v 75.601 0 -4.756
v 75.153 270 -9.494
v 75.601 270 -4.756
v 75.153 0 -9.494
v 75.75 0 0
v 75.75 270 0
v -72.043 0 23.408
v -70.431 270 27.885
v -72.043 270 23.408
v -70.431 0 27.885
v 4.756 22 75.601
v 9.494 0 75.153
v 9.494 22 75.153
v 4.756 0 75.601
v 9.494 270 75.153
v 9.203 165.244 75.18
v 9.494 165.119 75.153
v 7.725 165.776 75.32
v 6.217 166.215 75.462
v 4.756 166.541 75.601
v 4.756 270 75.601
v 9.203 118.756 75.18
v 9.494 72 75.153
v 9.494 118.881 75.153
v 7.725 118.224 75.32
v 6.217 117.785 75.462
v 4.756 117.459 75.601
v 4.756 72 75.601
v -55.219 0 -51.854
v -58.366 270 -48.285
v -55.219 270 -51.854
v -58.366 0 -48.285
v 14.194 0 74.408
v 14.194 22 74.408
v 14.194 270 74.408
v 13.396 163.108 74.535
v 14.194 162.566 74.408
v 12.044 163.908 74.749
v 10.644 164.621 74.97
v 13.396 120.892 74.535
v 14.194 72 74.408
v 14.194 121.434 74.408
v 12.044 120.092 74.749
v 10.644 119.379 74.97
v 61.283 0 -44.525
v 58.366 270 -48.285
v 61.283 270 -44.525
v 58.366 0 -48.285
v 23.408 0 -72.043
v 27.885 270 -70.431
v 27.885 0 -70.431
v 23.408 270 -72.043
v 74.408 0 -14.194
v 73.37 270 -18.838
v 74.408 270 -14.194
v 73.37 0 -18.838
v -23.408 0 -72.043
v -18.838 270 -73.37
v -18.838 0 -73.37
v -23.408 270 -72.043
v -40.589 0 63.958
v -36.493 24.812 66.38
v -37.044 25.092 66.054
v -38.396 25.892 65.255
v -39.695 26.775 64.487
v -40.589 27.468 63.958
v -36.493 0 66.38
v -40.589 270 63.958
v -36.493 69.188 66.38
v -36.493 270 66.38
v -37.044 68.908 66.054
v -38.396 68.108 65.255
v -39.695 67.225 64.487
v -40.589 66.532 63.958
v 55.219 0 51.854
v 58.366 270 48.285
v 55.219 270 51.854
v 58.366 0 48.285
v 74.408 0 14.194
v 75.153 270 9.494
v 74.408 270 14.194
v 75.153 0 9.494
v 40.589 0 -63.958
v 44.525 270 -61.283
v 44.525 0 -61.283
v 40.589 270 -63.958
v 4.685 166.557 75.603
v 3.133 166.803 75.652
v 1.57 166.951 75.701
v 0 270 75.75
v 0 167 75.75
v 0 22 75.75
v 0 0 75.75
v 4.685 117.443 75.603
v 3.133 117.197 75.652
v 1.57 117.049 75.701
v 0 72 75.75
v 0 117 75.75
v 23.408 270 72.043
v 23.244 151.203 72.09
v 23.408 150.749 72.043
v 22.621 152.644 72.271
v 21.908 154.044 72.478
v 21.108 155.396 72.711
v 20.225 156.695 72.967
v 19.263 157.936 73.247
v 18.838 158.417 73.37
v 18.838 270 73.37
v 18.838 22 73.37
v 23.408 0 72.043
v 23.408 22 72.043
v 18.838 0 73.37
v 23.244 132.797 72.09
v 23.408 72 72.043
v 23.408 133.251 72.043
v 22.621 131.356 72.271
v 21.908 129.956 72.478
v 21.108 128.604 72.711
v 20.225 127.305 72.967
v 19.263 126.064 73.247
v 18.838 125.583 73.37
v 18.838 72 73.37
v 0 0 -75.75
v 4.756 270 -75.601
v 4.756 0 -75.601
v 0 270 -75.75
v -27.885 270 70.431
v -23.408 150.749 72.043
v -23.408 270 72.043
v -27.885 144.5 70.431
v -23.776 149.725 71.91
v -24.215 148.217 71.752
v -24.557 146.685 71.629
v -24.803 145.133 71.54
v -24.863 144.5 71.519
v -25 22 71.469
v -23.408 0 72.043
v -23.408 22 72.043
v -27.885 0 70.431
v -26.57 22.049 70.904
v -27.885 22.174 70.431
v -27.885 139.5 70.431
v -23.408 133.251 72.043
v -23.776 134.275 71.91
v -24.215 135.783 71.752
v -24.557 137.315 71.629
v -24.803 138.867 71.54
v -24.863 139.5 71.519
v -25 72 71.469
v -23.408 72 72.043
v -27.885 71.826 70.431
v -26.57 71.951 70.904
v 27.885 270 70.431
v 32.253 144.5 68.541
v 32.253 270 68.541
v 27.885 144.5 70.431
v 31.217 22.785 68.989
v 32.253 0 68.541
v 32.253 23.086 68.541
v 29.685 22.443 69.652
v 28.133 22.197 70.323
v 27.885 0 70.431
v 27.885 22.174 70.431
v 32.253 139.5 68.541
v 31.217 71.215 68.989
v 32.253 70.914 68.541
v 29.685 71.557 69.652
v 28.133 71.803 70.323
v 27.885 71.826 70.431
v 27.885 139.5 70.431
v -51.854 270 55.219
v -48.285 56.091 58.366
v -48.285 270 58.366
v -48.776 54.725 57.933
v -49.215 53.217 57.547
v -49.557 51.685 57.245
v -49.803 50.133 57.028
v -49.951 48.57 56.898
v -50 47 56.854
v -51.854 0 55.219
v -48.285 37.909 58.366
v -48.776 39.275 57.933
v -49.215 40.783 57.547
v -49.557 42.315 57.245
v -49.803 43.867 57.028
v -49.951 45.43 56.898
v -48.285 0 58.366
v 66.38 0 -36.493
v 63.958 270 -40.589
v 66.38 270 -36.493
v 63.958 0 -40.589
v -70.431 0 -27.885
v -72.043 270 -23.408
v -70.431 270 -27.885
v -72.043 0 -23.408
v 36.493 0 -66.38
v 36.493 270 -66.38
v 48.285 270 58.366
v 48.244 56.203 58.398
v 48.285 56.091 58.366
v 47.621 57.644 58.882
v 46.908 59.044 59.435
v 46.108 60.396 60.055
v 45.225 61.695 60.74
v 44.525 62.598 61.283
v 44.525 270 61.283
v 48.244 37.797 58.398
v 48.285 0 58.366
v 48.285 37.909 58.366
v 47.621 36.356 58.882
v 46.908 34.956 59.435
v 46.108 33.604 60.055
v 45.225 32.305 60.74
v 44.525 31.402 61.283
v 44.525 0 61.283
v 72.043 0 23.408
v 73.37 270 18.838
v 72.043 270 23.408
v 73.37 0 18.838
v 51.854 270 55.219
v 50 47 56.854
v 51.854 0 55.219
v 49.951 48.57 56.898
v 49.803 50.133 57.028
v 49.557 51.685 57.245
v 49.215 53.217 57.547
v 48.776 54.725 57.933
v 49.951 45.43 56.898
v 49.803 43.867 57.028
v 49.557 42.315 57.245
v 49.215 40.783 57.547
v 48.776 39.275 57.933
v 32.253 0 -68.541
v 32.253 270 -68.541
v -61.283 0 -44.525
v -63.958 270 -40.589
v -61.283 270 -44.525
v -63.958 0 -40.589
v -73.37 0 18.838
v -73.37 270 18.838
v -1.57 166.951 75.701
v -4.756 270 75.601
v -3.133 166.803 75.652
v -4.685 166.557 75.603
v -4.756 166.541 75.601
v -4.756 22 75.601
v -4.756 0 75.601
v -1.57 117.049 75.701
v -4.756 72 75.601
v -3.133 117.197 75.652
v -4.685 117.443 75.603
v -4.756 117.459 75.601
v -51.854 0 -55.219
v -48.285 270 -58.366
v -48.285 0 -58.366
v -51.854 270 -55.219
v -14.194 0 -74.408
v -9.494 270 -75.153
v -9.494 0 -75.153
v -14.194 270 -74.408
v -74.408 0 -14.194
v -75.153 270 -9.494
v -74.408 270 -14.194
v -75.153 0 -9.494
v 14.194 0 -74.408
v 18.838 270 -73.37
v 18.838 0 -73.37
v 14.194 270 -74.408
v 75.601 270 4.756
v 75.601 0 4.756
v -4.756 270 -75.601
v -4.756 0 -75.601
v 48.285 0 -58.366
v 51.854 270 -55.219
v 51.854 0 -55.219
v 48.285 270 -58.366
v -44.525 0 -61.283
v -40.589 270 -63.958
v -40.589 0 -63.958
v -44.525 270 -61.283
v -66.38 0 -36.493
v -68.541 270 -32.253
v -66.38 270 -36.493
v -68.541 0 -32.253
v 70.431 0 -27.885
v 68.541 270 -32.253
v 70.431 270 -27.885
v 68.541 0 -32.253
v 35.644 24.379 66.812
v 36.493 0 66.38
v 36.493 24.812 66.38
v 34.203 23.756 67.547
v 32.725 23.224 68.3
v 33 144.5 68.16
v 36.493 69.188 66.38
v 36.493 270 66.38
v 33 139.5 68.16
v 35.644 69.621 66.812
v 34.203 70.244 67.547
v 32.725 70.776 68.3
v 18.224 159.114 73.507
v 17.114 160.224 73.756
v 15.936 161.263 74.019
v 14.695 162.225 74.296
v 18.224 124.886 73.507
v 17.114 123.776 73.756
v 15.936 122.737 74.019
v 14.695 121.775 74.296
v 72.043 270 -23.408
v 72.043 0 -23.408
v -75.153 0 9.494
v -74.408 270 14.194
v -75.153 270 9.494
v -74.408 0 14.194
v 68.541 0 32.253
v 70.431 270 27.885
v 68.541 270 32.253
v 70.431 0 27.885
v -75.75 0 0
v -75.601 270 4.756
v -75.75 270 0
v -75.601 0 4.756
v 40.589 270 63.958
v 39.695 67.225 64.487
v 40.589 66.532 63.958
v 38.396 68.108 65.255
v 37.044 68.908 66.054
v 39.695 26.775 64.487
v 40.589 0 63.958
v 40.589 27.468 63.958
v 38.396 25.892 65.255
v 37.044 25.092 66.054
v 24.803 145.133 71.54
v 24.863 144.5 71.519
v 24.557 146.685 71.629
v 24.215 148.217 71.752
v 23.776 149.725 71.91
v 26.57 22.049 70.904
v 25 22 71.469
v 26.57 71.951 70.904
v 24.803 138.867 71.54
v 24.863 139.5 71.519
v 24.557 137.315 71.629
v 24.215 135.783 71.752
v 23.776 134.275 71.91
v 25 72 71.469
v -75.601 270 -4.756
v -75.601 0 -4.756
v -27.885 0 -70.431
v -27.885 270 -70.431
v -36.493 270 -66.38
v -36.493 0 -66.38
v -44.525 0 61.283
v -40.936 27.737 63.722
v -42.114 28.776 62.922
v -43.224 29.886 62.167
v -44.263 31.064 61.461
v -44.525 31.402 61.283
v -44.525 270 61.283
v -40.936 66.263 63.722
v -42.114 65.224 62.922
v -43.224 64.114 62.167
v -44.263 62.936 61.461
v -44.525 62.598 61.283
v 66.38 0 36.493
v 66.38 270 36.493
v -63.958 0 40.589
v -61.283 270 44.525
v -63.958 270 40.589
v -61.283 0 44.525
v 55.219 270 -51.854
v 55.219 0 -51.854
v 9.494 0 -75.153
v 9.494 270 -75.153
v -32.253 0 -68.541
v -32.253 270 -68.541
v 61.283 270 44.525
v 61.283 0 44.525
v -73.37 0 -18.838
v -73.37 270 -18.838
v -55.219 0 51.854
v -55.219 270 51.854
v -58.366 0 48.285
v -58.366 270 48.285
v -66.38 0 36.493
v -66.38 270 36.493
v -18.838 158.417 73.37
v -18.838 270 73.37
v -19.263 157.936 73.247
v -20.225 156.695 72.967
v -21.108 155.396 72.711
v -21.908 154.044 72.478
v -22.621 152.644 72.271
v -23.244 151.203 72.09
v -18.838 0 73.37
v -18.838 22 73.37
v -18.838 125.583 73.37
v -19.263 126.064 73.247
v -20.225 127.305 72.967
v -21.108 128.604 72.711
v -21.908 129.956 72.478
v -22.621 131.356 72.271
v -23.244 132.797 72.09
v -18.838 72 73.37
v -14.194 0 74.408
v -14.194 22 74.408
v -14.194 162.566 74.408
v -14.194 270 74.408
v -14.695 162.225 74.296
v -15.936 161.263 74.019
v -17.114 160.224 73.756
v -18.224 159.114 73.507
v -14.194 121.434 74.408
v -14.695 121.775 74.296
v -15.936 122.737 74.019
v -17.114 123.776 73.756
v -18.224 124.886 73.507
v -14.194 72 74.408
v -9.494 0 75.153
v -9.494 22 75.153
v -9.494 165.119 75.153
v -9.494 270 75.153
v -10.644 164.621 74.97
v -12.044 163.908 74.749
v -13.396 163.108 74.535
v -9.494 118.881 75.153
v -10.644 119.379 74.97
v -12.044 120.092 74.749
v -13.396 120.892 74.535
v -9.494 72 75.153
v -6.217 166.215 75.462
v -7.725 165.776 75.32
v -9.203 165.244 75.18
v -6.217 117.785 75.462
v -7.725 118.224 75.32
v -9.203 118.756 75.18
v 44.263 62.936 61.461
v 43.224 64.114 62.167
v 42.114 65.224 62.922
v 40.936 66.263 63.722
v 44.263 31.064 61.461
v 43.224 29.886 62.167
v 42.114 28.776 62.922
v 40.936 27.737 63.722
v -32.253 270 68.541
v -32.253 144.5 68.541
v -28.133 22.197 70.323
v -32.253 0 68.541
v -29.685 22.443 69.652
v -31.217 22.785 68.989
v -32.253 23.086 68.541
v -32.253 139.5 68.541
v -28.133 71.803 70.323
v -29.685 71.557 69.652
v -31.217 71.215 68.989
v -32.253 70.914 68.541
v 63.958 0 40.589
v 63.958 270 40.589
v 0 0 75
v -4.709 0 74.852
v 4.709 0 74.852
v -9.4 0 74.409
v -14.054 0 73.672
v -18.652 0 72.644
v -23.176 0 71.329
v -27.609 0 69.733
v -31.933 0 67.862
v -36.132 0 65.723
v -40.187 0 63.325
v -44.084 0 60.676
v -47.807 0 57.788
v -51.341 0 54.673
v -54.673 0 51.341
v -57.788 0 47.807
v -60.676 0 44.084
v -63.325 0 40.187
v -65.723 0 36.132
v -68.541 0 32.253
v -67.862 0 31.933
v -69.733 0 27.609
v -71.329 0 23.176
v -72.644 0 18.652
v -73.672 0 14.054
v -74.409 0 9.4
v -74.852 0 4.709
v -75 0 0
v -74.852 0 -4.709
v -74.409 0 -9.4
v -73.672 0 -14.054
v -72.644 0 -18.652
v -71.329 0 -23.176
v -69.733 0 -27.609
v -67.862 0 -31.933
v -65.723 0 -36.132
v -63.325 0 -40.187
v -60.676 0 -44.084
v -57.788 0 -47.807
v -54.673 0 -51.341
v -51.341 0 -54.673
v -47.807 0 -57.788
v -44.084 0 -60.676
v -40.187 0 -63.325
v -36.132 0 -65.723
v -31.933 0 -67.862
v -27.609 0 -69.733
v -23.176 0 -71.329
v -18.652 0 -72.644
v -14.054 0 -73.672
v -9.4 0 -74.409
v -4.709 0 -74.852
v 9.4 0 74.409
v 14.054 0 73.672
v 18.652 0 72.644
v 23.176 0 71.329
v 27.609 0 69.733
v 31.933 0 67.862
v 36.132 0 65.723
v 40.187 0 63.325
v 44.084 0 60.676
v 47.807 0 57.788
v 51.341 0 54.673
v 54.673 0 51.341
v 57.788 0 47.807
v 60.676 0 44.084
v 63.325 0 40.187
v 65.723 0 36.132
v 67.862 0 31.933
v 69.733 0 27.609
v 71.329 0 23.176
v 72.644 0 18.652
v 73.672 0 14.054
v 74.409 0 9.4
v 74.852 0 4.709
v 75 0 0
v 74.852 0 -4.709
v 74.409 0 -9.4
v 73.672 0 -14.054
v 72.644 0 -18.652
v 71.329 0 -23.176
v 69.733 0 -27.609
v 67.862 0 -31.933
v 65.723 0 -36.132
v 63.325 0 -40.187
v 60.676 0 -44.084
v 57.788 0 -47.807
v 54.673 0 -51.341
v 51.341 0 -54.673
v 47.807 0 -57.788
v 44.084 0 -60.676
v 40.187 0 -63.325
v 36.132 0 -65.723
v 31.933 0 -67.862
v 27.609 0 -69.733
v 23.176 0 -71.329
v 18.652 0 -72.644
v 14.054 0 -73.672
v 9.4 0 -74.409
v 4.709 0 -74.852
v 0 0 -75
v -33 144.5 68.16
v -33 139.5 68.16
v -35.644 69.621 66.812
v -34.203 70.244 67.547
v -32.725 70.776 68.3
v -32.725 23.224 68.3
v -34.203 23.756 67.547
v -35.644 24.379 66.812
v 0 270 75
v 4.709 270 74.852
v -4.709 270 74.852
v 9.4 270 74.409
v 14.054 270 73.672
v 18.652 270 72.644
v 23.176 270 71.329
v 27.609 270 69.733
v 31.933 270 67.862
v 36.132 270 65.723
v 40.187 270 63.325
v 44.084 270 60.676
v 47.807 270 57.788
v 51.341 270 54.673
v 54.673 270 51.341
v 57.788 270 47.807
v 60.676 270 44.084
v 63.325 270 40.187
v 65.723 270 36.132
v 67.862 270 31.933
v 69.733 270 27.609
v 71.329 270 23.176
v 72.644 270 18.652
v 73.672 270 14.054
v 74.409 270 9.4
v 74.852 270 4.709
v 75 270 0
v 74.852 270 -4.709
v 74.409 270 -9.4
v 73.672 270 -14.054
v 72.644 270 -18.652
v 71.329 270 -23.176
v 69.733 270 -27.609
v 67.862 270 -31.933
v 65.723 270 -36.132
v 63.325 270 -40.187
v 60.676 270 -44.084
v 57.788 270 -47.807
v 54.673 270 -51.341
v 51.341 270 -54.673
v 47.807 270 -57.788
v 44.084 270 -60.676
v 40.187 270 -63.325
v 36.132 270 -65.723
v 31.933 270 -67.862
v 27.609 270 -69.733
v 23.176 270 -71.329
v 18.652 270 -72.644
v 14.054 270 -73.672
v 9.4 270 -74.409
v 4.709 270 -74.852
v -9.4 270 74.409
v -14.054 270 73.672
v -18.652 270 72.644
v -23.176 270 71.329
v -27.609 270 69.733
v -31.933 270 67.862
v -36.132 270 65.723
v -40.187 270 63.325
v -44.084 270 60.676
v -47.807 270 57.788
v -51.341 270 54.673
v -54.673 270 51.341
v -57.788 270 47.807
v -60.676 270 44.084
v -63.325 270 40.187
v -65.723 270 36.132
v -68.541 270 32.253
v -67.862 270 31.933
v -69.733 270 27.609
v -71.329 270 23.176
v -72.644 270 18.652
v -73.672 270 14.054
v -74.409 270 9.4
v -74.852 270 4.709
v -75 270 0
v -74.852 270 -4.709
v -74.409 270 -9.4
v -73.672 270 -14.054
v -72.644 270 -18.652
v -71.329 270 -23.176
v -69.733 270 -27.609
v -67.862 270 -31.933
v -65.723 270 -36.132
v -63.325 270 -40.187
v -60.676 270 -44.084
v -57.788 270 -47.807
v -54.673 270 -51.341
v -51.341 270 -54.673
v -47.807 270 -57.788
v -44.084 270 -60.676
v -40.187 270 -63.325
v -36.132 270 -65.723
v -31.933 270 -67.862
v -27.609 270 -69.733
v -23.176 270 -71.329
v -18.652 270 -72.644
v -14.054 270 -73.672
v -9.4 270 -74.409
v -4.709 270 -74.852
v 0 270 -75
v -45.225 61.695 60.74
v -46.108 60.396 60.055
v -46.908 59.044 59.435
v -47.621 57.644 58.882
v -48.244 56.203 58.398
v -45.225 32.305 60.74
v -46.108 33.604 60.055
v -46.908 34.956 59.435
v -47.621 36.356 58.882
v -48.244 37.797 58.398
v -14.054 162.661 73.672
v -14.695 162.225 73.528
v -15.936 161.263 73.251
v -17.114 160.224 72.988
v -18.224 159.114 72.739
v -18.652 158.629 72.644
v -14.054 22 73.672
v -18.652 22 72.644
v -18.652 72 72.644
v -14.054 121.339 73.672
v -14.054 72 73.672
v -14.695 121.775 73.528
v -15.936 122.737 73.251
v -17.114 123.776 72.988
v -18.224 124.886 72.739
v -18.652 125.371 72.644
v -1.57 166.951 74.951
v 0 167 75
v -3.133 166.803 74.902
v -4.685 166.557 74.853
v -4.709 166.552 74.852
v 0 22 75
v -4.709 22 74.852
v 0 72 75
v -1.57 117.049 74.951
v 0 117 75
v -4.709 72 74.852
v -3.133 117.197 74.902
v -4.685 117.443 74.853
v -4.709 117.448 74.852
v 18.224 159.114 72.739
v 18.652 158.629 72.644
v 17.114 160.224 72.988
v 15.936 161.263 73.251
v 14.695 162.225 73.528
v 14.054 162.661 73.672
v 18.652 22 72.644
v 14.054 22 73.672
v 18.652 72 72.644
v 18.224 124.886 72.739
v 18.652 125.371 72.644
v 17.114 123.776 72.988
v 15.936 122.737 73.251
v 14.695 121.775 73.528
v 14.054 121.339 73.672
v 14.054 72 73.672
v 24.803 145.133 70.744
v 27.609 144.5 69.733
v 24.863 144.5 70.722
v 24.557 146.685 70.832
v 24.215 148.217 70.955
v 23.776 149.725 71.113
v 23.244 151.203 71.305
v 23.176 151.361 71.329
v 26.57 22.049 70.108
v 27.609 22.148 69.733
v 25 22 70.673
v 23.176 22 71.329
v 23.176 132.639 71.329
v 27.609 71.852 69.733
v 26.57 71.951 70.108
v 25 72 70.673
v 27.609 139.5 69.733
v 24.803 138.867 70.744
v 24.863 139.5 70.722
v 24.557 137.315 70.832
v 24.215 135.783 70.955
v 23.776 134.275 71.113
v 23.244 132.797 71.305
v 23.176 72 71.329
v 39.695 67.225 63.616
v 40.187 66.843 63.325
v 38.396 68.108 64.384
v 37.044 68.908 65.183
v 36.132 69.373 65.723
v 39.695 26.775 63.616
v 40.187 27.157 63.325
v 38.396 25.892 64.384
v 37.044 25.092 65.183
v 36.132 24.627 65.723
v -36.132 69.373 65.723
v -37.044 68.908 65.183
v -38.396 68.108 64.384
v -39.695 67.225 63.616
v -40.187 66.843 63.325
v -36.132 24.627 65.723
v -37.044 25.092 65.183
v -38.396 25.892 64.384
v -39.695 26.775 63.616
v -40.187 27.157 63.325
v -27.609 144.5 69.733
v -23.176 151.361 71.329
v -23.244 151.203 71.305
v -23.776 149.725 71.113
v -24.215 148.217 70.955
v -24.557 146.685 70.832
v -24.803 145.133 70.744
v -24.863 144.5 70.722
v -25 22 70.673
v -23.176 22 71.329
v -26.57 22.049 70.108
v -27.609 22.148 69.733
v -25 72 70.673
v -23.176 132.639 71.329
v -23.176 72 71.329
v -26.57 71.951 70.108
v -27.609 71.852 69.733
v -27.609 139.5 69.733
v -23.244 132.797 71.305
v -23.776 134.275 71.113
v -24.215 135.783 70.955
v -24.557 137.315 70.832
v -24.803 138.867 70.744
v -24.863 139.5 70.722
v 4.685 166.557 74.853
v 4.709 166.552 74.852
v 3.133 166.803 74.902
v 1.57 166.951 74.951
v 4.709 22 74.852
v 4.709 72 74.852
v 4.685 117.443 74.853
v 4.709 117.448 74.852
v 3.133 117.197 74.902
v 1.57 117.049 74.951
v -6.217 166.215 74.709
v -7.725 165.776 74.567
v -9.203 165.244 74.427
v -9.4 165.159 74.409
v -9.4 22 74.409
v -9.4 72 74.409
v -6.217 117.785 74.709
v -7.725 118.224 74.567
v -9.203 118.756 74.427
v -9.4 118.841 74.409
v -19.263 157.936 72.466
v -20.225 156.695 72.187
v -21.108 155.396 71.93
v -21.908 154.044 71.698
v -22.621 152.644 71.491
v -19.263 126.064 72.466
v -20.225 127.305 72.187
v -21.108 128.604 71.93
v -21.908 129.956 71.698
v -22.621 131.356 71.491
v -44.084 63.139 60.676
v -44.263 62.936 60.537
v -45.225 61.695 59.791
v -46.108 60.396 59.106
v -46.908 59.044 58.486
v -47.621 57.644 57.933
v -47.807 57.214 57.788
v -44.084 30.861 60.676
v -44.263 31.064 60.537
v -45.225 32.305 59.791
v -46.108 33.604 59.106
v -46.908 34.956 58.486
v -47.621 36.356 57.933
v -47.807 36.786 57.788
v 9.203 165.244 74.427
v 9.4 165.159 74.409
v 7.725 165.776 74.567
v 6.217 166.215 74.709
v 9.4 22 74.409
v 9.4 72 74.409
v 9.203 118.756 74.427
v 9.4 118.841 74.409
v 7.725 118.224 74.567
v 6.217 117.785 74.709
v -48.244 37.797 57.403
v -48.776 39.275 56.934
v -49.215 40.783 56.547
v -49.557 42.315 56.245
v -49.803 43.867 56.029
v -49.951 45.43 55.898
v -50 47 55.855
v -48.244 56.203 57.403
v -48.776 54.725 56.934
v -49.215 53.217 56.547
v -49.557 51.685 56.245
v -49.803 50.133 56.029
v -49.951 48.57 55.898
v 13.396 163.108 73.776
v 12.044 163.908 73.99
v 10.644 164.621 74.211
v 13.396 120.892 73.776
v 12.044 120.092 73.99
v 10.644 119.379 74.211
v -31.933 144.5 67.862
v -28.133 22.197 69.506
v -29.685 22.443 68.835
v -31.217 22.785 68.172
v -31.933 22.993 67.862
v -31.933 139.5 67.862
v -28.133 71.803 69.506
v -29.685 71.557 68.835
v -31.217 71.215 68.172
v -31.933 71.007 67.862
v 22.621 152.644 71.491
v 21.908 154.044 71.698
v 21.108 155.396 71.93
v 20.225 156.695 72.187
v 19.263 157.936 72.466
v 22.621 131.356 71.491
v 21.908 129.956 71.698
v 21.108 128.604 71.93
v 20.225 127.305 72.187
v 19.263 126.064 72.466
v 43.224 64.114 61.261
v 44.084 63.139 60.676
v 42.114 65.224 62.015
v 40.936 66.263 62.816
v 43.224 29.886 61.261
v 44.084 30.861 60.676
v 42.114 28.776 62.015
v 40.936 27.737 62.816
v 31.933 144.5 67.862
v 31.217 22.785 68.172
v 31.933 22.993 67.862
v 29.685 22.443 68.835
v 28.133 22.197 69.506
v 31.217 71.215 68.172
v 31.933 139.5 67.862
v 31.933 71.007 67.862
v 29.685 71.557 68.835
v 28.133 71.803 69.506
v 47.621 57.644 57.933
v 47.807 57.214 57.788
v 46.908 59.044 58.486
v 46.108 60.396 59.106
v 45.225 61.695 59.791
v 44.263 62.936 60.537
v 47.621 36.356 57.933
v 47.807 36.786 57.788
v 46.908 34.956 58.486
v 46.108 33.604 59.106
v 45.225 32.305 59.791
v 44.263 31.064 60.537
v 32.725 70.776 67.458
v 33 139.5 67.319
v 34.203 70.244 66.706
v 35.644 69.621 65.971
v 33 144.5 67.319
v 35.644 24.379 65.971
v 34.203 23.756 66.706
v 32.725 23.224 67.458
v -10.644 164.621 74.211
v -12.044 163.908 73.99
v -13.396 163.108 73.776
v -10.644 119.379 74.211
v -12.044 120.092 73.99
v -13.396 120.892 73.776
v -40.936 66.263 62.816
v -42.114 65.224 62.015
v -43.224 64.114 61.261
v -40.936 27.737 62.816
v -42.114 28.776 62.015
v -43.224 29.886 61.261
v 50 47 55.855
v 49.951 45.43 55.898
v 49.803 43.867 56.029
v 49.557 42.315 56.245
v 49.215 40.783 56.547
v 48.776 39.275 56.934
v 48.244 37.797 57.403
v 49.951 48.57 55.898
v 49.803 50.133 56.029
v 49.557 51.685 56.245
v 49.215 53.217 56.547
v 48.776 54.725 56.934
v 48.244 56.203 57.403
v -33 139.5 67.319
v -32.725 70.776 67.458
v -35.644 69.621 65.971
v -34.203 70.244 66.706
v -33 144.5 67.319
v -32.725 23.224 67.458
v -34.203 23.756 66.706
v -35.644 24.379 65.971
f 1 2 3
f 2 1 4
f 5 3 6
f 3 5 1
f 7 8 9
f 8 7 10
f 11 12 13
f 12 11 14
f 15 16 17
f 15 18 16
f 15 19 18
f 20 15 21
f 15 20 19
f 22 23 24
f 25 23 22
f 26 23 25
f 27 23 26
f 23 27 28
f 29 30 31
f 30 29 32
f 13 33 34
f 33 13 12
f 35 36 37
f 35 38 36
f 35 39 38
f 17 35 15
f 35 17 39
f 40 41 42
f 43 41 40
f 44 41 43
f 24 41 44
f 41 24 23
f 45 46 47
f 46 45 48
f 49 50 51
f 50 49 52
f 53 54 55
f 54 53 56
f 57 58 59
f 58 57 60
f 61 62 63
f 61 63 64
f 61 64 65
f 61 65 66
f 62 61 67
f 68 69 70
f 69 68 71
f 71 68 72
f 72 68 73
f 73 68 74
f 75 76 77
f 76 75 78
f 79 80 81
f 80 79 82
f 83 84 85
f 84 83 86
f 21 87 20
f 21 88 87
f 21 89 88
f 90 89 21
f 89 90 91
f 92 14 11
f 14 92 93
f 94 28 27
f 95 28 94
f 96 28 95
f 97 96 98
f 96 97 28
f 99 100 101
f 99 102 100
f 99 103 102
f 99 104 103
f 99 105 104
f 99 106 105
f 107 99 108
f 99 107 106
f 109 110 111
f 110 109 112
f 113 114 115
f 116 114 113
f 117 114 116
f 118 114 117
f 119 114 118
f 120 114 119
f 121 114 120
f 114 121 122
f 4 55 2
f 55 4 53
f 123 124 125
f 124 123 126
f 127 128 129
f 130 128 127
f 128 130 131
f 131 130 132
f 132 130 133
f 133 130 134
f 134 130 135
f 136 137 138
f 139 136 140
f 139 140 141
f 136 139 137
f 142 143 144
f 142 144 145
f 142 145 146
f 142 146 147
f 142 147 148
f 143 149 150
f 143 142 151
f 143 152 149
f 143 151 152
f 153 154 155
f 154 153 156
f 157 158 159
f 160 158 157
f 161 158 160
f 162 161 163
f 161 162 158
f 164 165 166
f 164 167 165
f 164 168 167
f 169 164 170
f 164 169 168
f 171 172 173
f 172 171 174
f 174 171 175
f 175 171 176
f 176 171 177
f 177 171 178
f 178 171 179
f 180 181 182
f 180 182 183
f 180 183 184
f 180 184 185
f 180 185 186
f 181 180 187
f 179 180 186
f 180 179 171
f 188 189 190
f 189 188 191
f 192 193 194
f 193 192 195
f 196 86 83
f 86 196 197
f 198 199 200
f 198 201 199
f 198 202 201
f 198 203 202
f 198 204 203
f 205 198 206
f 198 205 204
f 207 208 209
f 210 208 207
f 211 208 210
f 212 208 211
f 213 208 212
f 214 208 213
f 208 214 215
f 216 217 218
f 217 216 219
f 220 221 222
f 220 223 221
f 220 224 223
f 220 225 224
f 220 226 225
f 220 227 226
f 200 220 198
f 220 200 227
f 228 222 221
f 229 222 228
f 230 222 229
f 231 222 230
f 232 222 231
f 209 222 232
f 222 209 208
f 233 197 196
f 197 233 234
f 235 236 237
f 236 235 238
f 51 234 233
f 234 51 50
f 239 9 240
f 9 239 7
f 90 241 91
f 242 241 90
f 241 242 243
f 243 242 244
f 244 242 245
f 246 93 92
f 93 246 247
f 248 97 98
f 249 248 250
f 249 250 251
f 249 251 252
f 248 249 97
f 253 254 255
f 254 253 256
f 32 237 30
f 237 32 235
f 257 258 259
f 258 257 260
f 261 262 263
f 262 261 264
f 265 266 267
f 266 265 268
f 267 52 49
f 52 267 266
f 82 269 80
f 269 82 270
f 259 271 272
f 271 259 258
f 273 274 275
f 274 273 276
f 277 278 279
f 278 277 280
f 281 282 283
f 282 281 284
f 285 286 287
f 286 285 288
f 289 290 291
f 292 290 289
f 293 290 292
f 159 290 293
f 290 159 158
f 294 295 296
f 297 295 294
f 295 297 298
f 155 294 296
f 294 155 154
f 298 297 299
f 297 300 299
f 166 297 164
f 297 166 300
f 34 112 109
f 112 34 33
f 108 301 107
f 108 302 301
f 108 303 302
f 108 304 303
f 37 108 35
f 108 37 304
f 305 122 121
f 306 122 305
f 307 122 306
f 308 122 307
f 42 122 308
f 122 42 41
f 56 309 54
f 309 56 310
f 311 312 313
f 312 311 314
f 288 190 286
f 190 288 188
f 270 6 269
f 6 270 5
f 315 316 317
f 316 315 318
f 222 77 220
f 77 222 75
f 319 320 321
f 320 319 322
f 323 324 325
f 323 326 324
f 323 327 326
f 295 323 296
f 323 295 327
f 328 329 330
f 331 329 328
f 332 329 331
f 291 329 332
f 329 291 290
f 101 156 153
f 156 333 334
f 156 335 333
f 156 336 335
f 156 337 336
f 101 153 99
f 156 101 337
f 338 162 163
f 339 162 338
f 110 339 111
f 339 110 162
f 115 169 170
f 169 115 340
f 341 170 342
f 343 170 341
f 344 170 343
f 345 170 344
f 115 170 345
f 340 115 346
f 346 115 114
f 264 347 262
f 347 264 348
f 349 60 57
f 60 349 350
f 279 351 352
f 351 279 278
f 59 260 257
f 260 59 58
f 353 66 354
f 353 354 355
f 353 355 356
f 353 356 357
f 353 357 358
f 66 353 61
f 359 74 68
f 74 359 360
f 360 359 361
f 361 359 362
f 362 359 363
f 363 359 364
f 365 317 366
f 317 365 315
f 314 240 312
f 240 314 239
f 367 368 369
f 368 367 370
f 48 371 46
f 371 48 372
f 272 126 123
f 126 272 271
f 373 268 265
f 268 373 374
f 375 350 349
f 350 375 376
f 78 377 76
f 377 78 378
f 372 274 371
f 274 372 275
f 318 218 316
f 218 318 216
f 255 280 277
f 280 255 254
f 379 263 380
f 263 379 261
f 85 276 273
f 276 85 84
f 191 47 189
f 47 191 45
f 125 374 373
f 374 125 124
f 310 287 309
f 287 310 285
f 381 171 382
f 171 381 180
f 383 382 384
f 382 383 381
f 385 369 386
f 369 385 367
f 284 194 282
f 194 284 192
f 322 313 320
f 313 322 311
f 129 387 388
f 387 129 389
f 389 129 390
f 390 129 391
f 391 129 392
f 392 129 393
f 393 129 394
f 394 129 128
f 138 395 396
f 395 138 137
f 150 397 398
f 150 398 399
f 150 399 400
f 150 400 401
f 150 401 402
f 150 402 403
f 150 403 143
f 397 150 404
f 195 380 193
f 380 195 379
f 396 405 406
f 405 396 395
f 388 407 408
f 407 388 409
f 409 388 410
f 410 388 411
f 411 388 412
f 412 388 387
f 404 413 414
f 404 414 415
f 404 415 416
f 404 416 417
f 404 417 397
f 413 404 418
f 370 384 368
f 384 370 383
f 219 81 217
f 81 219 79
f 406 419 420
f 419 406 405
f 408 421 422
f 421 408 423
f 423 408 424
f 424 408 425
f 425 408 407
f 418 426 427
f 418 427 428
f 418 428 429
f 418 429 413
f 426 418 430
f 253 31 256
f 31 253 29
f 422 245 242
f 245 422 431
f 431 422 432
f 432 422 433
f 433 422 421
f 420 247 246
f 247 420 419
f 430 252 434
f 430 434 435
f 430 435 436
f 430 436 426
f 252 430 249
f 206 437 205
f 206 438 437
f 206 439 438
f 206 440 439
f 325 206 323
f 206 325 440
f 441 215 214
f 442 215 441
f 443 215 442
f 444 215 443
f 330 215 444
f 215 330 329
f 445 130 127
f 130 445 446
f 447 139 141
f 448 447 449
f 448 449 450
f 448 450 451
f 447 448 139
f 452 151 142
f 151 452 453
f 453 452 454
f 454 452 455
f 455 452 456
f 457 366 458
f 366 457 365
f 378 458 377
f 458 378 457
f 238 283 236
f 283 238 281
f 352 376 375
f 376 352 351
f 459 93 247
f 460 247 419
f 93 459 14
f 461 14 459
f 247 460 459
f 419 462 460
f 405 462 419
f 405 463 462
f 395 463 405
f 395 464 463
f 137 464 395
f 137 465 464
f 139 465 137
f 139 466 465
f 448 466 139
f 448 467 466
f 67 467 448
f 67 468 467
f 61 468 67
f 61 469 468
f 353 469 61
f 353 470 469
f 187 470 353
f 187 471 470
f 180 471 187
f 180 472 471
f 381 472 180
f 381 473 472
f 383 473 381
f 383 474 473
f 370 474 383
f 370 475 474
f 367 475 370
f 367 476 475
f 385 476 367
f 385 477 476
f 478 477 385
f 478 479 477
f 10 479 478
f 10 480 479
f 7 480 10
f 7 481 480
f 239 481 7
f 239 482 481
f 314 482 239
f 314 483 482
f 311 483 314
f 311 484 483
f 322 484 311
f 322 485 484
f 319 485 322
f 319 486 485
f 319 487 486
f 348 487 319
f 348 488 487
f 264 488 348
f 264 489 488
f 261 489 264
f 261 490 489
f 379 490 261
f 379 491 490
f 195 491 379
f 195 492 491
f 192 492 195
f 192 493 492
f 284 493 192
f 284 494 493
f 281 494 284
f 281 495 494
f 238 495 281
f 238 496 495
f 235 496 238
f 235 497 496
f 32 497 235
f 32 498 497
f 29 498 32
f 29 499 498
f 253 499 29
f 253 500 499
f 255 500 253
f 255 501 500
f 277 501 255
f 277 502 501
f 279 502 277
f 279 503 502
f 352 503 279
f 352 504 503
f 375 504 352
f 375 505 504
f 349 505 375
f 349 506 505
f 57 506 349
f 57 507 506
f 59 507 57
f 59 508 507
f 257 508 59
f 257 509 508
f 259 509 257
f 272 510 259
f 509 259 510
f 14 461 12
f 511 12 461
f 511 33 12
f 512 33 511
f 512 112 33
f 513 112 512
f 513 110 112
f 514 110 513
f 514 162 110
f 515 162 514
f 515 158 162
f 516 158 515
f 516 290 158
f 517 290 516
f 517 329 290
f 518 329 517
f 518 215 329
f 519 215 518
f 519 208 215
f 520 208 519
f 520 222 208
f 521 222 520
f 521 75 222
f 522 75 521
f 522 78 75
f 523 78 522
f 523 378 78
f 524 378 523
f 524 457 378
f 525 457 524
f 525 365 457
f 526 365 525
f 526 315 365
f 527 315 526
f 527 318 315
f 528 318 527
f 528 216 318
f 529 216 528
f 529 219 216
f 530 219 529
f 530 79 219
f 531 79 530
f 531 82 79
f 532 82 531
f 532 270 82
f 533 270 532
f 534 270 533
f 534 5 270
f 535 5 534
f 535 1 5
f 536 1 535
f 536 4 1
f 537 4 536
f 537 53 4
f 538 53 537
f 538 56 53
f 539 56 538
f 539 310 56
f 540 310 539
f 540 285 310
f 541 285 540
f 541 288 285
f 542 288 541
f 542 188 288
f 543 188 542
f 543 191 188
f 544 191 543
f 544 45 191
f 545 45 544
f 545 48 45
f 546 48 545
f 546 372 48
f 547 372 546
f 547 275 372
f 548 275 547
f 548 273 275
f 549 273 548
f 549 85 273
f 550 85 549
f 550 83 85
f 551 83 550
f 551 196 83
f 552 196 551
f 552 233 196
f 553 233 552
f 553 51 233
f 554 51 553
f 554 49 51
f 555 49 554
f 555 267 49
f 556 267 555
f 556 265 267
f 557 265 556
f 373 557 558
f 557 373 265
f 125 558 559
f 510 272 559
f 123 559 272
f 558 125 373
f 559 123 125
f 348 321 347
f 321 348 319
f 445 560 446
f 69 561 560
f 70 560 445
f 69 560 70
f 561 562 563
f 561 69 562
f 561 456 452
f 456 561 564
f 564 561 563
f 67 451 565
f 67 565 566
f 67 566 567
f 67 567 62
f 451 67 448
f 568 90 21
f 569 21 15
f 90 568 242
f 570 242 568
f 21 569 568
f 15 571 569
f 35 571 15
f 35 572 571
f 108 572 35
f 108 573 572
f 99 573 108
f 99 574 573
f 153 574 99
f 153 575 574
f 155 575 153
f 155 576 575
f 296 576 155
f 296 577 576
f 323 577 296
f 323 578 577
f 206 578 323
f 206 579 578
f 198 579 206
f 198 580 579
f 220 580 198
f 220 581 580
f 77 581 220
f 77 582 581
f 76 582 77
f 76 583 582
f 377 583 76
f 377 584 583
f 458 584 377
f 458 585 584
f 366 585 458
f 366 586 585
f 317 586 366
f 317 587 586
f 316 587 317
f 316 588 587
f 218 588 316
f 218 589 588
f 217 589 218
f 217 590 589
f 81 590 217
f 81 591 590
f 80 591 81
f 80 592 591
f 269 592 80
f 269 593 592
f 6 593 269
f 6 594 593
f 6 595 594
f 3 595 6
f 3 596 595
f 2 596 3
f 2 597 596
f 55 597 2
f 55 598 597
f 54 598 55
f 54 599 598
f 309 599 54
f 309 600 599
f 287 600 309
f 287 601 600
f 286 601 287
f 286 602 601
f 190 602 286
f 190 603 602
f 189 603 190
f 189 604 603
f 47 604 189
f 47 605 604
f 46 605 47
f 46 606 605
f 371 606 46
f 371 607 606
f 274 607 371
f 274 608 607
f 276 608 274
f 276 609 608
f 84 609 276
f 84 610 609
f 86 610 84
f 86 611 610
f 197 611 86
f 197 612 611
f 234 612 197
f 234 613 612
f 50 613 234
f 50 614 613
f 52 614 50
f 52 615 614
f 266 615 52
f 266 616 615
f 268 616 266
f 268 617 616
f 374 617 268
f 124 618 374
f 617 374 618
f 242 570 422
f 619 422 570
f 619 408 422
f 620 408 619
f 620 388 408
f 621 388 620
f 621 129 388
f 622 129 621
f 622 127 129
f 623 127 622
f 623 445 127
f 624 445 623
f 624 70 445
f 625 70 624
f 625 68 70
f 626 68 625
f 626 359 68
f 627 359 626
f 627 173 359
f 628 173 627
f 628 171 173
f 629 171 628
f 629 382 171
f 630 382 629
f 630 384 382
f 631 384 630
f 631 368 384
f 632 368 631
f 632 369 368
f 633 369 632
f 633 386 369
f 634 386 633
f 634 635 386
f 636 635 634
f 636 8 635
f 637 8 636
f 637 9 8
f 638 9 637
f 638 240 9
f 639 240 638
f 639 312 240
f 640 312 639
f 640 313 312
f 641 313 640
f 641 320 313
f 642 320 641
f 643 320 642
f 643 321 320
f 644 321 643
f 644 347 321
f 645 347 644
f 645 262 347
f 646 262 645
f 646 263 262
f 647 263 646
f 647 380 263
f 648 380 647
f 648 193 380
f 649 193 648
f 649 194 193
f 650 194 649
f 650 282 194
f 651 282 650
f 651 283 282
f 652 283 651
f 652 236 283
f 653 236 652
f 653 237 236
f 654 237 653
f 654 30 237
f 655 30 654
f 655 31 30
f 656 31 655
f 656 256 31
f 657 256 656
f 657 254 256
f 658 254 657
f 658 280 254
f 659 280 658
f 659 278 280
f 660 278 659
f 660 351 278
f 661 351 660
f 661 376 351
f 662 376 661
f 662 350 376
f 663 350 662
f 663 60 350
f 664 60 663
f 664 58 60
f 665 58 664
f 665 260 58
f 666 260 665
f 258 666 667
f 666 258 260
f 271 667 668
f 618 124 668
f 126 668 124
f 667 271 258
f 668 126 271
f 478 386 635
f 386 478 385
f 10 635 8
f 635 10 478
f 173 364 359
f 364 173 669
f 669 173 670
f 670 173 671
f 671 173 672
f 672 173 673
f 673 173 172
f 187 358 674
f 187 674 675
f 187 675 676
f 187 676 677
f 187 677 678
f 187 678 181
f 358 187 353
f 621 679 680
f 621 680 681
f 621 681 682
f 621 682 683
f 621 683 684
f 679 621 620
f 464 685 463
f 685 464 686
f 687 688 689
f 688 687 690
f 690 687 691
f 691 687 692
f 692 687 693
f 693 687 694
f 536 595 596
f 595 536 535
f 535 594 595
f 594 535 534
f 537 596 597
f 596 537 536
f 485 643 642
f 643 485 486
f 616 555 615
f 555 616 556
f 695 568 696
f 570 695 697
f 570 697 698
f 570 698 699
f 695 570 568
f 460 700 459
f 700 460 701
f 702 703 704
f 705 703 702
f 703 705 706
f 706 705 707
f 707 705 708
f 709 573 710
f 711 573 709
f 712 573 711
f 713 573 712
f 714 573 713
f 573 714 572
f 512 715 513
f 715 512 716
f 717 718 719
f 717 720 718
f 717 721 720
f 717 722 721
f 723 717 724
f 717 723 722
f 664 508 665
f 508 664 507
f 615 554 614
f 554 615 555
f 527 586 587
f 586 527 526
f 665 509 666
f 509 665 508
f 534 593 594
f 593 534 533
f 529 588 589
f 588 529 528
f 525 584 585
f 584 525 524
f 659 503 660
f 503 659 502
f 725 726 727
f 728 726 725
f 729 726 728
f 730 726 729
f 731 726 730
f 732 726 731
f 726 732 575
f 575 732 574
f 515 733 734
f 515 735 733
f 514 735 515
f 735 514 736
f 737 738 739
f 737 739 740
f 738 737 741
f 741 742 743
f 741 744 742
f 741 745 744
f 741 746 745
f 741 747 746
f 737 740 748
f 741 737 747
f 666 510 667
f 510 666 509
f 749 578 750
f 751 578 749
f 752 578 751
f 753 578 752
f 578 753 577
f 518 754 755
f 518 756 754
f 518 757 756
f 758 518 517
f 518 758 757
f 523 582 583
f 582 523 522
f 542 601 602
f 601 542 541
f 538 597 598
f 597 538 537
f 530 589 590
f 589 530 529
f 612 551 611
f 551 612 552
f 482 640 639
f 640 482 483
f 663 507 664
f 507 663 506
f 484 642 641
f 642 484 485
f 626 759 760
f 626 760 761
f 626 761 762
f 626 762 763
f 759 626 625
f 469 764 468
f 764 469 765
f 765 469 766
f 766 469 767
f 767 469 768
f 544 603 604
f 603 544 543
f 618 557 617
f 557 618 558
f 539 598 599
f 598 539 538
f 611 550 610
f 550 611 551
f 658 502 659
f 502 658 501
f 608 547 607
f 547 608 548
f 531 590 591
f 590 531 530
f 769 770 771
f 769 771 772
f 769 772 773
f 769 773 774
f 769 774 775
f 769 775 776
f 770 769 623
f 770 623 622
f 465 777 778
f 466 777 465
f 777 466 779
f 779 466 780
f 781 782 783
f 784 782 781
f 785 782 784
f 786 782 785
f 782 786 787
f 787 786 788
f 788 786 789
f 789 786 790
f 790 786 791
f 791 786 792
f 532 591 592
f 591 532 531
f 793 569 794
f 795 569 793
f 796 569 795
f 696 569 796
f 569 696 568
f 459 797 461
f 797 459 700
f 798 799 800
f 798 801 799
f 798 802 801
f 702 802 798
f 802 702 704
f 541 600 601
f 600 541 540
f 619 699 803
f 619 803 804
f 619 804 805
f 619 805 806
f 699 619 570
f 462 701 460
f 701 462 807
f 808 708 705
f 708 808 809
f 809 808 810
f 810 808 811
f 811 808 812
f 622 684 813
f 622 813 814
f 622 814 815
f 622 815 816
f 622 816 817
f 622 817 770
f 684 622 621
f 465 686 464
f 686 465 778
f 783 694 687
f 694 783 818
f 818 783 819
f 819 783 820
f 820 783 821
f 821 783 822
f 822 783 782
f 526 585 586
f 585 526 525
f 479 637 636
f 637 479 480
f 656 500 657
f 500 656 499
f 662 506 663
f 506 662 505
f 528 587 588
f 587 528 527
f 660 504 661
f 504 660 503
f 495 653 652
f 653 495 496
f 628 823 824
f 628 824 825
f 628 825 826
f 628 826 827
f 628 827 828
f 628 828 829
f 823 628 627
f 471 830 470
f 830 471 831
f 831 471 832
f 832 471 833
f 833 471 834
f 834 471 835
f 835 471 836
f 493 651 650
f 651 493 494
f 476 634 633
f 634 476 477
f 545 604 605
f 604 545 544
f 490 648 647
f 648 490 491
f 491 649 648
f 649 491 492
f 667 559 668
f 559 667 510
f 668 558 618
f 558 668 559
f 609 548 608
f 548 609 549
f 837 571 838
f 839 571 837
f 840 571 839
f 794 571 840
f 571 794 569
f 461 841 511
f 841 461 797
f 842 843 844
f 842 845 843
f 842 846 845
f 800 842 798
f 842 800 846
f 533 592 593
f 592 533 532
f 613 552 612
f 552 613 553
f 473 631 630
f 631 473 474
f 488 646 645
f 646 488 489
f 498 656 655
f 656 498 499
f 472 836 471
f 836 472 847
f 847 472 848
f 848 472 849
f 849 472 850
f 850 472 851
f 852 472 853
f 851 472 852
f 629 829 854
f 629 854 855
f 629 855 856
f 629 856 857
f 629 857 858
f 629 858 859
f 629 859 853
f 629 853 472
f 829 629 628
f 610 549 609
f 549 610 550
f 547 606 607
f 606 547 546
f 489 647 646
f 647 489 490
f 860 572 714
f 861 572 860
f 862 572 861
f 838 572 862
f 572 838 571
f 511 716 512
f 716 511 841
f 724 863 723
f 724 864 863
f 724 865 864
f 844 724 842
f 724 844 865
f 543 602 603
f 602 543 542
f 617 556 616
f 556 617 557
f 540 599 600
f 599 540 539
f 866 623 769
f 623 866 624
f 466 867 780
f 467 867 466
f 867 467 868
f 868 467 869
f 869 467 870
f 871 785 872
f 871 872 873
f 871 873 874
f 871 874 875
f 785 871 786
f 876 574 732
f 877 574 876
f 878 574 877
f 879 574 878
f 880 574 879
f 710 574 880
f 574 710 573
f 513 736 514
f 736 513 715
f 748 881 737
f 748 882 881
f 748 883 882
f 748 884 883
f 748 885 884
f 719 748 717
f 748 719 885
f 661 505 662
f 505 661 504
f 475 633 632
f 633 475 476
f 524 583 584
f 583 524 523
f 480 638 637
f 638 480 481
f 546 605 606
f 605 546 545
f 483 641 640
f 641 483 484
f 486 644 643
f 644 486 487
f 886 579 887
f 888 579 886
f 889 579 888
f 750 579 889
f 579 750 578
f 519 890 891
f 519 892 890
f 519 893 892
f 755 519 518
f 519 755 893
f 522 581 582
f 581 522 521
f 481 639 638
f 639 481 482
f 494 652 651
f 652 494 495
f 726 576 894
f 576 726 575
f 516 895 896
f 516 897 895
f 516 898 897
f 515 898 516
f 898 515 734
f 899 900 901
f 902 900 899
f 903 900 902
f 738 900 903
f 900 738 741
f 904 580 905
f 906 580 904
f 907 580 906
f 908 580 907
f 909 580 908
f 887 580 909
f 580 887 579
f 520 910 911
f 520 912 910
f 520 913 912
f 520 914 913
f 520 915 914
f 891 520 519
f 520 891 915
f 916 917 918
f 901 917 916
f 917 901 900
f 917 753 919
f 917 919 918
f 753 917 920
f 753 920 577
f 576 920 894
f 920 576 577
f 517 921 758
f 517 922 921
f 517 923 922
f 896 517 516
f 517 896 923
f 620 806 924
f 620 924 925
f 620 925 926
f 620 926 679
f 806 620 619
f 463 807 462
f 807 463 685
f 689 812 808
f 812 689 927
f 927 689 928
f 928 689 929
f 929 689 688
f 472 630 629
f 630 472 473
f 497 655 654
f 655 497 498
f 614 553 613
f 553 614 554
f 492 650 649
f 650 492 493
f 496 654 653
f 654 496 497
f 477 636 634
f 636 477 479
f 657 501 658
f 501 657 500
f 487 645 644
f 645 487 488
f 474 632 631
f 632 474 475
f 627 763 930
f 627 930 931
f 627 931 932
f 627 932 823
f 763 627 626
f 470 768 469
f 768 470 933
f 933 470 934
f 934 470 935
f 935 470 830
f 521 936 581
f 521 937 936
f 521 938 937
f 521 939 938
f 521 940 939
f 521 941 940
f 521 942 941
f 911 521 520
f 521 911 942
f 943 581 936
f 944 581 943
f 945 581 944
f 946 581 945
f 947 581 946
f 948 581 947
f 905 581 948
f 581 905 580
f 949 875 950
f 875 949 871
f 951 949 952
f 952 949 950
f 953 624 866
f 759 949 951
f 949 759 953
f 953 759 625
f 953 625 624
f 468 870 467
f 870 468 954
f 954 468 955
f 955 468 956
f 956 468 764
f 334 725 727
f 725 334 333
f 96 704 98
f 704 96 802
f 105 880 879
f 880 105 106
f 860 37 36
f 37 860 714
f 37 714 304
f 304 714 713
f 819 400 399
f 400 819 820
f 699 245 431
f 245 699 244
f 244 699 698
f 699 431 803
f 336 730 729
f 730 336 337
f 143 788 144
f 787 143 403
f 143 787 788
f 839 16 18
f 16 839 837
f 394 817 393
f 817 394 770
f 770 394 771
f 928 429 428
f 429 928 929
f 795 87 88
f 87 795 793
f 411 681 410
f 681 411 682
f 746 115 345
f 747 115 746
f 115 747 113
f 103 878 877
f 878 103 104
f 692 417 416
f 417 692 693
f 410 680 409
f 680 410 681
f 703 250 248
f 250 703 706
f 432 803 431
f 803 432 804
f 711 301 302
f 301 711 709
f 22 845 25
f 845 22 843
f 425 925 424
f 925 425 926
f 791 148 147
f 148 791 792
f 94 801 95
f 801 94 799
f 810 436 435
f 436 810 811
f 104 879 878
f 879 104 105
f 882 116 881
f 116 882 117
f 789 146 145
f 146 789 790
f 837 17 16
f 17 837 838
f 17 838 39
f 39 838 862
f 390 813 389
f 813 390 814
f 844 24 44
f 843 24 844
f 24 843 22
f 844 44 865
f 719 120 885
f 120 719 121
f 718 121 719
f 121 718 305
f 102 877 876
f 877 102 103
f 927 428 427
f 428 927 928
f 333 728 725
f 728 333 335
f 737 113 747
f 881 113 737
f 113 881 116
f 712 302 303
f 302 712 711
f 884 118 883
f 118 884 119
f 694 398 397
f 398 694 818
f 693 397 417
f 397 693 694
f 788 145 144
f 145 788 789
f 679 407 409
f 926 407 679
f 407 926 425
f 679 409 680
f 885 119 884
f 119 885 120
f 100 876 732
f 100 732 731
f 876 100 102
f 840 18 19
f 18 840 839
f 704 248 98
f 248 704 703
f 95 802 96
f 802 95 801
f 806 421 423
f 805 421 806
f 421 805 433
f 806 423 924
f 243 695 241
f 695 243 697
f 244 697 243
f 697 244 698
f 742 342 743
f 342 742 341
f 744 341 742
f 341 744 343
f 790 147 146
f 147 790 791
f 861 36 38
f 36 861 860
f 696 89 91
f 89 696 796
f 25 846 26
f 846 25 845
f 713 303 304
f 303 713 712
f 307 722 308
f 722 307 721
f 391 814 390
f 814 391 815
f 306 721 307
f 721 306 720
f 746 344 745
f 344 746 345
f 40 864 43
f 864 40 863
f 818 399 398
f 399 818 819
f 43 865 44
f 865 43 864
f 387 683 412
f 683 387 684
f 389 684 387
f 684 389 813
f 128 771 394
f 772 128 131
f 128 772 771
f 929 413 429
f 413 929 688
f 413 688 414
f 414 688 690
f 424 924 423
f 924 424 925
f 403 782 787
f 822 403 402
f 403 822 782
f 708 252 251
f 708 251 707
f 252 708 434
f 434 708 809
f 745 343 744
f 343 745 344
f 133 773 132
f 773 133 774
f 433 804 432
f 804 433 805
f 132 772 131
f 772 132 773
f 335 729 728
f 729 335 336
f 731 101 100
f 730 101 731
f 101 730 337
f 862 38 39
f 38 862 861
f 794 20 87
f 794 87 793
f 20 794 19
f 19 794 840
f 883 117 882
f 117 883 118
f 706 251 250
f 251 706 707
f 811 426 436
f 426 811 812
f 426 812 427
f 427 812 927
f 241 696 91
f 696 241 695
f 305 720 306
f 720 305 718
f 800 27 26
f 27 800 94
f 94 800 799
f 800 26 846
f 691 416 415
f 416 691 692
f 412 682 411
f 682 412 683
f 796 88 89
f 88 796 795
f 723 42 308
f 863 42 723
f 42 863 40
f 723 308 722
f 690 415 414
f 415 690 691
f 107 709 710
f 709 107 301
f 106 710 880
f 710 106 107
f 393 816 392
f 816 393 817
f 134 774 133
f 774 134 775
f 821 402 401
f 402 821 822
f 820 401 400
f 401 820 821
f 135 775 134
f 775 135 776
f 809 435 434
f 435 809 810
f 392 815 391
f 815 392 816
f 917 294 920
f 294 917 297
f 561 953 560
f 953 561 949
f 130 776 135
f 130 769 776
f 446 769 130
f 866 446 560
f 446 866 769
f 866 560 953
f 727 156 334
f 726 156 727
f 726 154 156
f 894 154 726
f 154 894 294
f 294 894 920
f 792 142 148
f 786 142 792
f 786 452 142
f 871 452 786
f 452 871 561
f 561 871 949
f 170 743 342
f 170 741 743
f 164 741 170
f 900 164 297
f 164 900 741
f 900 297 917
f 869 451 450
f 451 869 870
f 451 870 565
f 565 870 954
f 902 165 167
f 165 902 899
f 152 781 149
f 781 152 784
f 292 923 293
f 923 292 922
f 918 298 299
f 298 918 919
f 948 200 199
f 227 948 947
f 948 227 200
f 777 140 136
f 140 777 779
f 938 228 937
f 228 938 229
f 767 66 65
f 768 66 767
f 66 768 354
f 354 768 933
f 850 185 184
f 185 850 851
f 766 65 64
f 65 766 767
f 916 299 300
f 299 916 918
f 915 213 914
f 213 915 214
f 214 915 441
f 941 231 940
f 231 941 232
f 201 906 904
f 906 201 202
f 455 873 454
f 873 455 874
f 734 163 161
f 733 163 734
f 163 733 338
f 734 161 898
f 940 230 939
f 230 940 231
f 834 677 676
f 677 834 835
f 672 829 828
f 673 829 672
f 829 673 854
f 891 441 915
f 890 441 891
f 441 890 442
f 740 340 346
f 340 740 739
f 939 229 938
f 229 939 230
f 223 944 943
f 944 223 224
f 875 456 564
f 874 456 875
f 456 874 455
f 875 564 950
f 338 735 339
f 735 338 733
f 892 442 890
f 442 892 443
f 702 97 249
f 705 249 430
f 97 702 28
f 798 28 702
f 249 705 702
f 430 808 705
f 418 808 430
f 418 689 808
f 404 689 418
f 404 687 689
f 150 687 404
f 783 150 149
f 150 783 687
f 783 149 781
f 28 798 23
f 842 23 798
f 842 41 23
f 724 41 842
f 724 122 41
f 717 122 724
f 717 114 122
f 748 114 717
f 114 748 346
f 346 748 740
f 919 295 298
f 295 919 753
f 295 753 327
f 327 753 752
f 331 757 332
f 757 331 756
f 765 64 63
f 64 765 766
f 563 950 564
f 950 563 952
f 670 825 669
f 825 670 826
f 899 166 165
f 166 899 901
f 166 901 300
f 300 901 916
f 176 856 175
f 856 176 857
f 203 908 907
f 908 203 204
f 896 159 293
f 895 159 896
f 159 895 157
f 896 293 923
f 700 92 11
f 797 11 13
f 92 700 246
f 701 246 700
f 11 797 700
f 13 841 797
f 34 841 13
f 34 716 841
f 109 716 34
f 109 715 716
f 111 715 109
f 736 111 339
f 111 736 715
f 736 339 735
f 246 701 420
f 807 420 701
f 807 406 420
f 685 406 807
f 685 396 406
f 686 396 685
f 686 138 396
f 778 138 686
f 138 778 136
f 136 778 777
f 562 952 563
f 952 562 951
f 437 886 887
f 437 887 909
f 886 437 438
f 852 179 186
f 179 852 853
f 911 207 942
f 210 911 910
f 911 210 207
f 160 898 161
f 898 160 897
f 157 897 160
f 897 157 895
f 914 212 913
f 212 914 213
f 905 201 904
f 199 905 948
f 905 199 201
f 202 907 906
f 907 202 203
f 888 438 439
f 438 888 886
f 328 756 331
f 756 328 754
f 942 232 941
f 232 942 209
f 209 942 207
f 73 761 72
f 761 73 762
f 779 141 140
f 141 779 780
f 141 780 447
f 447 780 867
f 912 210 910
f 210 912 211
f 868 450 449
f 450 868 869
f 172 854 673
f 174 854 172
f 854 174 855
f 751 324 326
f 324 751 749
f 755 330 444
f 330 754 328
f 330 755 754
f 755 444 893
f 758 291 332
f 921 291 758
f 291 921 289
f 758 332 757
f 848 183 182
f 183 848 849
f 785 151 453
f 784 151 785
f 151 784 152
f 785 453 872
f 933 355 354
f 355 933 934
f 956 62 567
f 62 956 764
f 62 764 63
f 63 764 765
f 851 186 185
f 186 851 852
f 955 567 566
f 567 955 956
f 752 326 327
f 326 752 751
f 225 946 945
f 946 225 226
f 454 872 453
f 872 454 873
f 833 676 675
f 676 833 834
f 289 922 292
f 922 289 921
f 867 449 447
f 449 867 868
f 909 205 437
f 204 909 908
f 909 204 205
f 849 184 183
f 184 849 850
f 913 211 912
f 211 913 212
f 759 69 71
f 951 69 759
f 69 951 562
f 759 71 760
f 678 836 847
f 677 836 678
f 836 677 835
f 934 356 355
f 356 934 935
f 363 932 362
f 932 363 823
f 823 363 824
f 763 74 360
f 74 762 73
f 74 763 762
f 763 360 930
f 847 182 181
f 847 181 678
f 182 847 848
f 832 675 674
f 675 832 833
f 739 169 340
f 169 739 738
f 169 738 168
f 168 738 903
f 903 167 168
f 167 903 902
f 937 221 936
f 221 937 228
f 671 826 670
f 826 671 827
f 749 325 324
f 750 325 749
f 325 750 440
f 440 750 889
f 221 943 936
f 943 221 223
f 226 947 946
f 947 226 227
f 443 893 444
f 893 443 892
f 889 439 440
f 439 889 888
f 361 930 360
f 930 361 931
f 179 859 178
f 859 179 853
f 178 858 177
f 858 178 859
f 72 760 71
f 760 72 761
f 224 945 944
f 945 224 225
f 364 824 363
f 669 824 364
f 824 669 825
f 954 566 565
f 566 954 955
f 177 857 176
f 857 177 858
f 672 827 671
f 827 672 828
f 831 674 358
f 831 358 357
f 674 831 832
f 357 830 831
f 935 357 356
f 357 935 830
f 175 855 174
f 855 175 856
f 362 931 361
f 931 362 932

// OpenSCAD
module cutoutTube(th,di,he,hole,holepos,wiw,wil,dis) {
// th = thickness of the used tube
// di = diameter of the tube
// he = height of the tube (length)
// hole = hose insert hole diameter
// wiw = hose insert cover wing-cut width 
// wiw = hose insert cover wing-cut length
// dis = distance between batteries-hole circular cutouts (between centers)

$fn=100;

 module tube(th,di,he){
  rotate([-90,0,0]) 
   difference(){
    cylinder(d=di+th,h=he);
    translate([0,0,-1])
     cylinder(d=di,h=he+5);
   }
 }
 
 module HoseCutout(th,rad,hole,wiw,wil) {
cylinder(d=hole,h=rad/2);
translate([-(hole+2*wil)/2,-wiw/2,0]) cube([hole+2*wil,wiw,rad/2]);
}

module BatteriesCutout(hole,dis) {
hull() {
    cylinder(d=hole,h=di/2);
    translate([dis,0,0]) cylinder(d=hole,h=di/2);
    }
}

difference() {
tube(th,di,he);
group() {
translate([0,holepos,di/3])
 HoseCutout(th,di/2,hole,wiw,wil);
translate([-dis/2,hole/2+22,di/4])
 BatteriesCutout(hole,dis);
}
}
}

cutoutTube(1.5,150,270,50,142,5,8,50);
